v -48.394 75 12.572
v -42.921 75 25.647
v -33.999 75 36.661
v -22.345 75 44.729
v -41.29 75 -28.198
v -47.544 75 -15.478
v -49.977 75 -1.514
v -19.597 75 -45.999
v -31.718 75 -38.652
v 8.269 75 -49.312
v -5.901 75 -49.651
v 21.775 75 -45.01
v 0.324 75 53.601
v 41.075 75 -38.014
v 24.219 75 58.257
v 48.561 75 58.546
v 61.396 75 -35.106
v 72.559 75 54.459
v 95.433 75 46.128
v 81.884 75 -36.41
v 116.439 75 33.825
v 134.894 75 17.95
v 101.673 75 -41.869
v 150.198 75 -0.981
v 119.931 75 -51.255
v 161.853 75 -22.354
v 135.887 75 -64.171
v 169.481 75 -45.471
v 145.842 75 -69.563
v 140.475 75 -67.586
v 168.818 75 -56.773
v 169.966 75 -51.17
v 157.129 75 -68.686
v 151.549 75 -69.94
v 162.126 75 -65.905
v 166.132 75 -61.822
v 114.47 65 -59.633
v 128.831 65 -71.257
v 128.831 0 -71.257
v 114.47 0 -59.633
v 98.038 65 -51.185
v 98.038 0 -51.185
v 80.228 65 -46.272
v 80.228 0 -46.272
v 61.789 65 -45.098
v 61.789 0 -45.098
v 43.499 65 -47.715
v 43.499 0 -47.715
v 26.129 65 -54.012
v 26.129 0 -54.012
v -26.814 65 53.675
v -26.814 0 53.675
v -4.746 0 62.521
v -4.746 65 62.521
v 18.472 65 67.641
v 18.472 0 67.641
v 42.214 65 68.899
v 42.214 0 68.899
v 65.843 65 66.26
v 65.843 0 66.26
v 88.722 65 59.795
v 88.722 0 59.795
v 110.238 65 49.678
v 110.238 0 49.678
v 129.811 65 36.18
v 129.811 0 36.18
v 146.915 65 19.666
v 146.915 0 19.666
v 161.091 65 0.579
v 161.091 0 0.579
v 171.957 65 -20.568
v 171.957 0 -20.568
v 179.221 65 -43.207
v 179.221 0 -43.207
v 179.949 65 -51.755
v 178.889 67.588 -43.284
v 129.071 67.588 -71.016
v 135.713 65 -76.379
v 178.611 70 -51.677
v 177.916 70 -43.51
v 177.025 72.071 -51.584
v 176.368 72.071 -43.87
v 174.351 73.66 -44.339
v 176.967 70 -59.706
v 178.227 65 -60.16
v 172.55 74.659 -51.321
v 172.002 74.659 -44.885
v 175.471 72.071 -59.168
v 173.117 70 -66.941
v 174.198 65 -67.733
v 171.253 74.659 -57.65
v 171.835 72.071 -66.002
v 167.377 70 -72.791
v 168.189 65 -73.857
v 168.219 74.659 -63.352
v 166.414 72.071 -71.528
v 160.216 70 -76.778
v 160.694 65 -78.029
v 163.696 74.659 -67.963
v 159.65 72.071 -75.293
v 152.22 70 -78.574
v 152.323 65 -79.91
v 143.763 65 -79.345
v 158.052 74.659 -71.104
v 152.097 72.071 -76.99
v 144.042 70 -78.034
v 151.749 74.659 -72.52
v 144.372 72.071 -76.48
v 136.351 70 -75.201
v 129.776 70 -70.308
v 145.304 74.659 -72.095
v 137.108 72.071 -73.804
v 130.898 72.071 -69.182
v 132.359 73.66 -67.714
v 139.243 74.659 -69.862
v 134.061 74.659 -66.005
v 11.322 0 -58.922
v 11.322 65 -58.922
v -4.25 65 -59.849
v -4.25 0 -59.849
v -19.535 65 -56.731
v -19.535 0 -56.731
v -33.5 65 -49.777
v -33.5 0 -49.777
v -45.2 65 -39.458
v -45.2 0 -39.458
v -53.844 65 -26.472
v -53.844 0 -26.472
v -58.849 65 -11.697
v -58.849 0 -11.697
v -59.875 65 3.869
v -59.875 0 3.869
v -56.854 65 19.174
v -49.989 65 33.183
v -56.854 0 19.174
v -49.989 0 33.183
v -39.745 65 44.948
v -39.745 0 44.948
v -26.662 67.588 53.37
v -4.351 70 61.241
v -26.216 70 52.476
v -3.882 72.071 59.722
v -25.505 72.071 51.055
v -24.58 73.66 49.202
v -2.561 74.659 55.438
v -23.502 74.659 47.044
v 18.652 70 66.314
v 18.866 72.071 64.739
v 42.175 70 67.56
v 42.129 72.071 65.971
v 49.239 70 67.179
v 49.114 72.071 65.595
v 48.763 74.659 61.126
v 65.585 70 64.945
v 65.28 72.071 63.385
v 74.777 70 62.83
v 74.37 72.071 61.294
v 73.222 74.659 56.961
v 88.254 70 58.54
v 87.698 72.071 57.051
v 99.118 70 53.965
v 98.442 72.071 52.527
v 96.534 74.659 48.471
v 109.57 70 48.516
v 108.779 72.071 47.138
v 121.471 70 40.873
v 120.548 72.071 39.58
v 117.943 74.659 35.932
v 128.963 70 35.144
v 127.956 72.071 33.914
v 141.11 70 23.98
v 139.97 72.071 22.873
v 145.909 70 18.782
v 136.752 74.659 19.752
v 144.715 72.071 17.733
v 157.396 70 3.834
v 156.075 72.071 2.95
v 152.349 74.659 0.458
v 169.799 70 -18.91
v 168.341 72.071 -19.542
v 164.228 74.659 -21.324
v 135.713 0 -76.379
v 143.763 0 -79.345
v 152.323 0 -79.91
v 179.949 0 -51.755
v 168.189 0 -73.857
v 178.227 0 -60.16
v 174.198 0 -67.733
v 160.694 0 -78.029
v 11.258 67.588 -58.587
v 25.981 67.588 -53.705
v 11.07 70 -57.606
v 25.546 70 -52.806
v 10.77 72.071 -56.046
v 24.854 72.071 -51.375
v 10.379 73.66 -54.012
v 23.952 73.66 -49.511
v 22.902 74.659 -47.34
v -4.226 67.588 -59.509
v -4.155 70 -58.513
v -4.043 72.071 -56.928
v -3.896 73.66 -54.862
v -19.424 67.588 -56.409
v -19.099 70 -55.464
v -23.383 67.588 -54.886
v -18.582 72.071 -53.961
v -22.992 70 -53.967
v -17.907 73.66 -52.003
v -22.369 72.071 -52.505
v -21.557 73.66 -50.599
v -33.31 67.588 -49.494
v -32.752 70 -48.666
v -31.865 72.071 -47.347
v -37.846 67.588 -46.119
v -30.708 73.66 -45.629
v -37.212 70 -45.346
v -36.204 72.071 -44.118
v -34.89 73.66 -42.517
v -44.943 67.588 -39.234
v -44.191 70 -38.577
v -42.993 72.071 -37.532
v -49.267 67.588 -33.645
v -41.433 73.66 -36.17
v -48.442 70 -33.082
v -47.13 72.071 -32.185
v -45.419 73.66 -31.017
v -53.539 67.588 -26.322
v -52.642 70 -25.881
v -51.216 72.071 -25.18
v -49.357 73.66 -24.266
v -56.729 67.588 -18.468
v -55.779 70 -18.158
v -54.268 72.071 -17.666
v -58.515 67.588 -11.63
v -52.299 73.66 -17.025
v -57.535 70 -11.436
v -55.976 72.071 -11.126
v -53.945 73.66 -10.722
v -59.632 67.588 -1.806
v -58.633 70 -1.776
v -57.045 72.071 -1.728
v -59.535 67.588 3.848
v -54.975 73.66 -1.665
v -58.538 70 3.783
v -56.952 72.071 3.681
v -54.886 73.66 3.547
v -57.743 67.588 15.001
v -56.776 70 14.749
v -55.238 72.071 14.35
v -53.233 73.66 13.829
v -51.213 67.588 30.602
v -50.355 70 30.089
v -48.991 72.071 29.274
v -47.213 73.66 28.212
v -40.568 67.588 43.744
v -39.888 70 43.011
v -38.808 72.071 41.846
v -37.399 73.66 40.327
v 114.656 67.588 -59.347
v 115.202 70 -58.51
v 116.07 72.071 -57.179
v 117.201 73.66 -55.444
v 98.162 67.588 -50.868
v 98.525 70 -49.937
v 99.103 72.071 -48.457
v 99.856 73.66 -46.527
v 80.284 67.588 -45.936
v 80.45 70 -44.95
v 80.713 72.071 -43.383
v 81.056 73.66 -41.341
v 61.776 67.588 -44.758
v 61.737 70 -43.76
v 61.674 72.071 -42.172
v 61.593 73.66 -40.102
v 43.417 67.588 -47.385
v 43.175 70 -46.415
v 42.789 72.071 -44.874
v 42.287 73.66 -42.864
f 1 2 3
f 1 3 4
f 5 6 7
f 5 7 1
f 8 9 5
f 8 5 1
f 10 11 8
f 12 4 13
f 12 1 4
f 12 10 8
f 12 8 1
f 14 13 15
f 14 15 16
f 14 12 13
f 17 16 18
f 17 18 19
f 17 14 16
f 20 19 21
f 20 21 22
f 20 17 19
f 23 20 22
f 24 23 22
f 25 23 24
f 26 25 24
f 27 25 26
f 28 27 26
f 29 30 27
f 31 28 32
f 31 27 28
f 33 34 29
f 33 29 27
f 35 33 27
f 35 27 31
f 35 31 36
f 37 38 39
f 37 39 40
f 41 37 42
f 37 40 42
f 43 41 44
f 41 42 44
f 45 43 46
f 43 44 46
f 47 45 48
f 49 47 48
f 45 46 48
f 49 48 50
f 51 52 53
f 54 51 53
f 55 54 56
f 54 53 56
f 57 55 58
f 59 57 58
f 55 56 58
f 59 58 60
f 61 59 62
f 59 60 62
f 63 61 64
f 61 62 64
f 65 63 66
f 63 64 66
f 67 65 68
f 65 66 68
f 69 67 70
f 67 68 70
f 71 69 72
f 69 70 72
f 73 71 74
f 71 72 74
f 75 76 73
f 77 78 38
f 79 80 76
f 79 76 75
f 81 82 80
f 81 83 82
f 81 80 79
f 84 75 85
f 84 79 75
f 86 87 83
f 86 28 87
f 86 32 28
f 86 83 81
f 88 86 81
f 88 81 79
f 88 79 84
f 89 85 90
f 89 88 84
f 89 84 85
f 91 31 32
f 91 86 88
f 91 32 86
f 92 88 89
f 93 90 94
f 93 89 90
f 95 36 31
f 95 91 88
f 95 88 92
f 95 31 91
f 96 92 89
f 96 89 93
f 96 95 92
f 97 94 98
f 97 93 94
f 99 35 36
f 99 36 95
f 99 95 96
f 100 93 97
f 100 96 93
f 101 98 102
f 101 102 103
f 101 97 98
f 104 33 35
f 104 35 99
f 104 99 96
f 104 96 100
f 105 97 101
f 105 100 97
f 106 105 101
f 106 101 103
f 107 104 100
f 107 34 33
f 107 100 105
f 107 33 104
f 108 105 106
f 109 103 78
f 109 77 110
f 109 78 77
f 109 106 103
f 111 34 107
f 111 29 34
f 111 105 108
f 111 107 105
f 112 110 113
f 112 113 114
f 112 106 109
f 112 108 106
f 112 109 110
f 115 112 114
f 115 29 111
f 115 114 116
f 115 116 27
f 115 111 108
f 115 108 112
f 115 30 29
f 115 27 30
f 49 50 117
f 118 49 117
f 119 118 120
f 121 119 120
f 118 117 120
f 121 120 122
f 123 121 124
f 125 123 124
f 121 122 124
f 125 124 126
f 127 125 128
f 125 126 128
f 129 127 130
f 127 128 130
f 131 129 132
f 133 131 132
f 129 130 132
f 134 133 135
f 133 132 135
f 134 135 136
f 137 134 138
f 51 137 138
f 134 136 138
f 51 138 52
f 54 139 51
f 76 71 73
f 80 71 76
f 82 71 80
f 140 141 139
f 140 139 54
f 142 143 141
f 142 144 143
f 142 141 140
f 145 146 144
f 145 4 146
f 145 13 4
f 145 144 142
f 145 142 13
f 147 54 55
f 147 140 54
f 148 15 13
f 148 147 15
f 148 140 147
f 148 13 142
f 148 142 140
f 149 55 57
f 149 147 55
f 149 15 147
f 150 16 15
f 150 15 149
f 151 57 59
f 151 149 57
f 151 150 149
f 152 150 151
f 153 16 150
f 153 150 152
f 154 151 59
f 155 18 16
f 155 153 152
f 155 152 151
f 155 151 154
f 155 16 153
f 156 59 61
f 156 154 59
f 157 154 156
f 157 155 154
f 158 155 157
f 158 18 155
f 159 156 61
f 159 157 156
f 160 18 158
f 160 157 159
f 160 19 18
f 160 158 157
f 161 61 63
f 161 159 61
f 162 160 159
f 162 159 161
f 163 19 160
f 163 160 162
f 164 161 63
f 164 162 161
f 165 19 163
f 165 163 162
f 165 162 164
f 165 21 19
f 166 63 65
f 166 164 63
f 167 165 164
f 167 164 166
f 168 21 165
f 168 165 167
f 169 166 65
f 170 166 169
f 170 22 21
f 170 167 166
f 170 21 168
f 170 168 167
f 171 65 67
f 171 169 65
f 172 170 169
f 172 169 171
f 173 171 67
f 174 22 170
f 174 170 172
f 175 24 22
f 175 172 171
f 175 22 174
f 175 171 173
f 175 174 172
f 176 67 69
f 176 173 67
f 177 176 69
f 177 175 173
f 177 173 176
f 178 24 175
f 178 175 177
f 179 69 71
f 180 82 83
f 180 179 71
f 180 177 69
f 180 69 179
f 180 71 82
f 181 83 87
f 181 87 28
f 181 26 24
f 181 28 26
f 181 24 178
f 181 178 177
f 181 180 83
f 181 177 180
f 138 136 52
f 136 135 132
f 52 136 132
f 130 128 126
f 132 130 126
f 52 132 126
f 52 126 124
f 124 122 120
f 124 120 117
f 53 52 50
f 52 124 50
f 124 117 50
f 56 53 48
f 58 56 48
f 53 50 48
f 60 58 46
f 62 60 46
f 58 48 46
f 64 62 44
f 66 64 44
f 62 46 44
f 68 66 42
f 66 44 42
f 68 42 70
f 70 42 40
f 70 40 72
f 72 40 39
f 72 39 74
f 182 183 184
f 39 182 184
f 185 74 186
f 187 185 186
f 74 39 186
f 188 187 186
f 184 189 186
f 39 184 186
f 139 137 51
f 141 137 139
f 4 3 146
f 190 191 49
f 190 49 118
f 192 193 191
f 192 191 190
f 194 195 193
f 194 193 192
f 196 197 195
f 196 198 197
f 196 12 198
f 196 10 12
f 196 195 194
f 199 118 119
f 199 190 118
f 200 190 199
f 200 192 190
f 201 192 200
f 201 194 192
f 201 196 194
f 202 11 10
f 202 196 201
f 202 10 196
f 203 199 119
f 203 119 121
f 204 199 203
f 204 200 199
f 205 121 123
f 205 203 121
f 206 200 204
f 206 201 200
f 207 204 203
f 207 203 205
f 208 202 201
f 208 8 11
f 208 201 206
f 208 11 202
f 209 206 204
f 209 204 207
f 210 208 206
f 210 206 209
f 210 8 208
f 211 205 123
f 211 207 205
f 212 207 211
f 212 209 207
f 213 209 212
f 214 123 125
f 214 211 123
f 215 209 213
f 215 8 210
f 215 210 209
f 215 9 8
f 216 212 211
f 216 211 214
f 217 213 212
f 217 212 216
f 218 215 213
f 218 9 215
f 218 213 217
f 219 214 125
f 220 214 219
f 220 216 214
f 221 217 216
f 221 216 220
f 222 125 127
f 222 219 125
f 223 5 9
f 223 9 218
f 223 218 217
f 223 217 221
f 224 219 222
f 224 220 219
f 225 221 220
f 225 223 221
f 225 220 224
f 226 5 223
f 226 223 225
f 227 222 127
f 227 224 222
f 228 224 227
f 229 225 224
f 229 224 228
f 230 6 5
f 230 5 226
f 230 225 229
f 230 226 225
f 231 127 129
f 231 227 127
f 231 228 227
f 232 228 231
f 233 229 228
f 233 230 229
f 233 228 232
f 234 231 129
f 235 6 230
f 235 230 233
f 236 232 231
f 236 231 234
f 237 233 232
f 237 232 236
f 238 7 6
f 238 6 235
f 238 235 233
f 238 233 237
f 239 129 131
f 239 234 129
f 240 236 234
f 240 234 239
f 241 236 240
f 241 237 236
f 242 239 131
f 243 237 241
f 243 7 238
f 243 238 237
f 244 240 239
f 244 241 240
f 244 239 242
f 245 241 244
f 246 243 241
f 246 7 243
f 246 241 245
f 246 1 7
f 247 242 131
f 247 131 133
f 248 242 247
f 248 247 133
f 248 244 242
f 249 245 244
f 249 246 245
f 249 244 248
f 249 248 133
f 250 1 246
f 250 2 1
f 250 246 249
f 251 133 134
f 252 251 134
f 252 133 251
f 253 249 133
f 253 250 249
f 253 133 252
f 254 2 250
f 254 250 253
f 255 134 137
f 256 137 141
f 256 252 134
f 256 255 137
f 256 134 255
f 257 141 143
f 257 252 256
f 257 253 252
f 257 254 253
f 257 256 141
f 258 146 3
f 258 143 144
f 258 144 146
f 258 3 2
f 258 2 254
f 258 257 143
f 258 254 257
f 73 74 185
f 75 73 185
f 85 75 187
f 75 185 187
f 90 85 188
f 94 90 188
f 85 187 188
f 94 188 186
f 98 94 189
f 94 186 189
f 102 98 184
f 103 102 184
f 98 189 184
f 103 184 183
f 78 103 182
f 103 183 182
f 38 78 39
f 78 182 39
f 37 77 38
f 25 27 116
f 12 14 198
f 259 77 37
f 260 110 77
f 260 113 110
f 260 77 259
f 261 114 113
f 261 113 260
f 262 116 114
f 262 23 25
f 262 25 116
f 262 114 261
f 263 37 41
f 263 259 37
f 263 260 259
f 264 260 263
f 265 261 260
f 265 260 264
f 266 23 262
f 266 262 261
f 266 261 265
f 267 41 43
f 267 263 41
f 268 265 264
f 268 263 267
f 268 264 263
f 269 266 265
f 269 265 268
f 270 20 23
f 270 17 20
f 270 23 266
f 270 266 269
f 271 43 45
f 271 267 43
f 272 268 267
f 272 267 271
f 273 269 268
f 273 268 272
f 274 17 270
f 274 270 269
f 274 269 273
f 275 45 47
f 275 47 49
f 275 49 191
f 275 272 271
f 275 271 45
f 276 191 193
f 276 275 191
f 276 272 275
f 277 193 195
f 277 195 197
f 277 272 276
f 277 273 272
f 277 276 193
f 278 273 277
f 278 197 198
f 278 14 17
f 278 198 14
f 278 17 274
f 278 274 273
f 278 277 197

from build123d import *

# Parameters (mm, degrees)
BOSS_EXTRUDE1_DEPTH = 75
FILLET1_R           = 10


# Read off the part's stored shape, not the designer's step: Boss-Extrude1
with BuildPart() as part:
    # Boss-Extrude1 outline → Boss-Extrude1 (new body)
    with BuildSketch(Plane(origin=(0, 0, 0), x_dir=(1, 0, 0), z_dir=(0, 1, 0))):
        with BuildLine():
            ThreePointArc((179.220822611, 43.207097385), (164.591443385, 76.212397447), (128.83092118, 71.25723646))
            ThreePointArc((128.83092118, 71.25723646), (80.227844704, 46.271602396), (26.129473888, 54.011578336))
            ThreePointArc((26.129473888, 54.011578336), (-53.844334239, 26.472394497), (-26.8142447, -53.674912959))
            ThreePointArc((-26.8142447, -53.674912959), (99.687960456, -55.177812298), (179.220822611, 43.207097385))
        make_face()
    extrude(amount=BOSS_EXTRUDE1_DEPTH)

    # Fillet1
    fillet1_edges = [part.edges().sort_by_distance(p)[0] for p in [
        (99.687960456, 75, 55.177812298),
        (164.591443385, 75, -76.212397447),
        (80.227844704, 75, -46.271602396),
        (-53.844334239, 75, -26.472394497),
    ]]
    fillet(fillet1_edges, radius=FILLET1_R)


solid = part.part
